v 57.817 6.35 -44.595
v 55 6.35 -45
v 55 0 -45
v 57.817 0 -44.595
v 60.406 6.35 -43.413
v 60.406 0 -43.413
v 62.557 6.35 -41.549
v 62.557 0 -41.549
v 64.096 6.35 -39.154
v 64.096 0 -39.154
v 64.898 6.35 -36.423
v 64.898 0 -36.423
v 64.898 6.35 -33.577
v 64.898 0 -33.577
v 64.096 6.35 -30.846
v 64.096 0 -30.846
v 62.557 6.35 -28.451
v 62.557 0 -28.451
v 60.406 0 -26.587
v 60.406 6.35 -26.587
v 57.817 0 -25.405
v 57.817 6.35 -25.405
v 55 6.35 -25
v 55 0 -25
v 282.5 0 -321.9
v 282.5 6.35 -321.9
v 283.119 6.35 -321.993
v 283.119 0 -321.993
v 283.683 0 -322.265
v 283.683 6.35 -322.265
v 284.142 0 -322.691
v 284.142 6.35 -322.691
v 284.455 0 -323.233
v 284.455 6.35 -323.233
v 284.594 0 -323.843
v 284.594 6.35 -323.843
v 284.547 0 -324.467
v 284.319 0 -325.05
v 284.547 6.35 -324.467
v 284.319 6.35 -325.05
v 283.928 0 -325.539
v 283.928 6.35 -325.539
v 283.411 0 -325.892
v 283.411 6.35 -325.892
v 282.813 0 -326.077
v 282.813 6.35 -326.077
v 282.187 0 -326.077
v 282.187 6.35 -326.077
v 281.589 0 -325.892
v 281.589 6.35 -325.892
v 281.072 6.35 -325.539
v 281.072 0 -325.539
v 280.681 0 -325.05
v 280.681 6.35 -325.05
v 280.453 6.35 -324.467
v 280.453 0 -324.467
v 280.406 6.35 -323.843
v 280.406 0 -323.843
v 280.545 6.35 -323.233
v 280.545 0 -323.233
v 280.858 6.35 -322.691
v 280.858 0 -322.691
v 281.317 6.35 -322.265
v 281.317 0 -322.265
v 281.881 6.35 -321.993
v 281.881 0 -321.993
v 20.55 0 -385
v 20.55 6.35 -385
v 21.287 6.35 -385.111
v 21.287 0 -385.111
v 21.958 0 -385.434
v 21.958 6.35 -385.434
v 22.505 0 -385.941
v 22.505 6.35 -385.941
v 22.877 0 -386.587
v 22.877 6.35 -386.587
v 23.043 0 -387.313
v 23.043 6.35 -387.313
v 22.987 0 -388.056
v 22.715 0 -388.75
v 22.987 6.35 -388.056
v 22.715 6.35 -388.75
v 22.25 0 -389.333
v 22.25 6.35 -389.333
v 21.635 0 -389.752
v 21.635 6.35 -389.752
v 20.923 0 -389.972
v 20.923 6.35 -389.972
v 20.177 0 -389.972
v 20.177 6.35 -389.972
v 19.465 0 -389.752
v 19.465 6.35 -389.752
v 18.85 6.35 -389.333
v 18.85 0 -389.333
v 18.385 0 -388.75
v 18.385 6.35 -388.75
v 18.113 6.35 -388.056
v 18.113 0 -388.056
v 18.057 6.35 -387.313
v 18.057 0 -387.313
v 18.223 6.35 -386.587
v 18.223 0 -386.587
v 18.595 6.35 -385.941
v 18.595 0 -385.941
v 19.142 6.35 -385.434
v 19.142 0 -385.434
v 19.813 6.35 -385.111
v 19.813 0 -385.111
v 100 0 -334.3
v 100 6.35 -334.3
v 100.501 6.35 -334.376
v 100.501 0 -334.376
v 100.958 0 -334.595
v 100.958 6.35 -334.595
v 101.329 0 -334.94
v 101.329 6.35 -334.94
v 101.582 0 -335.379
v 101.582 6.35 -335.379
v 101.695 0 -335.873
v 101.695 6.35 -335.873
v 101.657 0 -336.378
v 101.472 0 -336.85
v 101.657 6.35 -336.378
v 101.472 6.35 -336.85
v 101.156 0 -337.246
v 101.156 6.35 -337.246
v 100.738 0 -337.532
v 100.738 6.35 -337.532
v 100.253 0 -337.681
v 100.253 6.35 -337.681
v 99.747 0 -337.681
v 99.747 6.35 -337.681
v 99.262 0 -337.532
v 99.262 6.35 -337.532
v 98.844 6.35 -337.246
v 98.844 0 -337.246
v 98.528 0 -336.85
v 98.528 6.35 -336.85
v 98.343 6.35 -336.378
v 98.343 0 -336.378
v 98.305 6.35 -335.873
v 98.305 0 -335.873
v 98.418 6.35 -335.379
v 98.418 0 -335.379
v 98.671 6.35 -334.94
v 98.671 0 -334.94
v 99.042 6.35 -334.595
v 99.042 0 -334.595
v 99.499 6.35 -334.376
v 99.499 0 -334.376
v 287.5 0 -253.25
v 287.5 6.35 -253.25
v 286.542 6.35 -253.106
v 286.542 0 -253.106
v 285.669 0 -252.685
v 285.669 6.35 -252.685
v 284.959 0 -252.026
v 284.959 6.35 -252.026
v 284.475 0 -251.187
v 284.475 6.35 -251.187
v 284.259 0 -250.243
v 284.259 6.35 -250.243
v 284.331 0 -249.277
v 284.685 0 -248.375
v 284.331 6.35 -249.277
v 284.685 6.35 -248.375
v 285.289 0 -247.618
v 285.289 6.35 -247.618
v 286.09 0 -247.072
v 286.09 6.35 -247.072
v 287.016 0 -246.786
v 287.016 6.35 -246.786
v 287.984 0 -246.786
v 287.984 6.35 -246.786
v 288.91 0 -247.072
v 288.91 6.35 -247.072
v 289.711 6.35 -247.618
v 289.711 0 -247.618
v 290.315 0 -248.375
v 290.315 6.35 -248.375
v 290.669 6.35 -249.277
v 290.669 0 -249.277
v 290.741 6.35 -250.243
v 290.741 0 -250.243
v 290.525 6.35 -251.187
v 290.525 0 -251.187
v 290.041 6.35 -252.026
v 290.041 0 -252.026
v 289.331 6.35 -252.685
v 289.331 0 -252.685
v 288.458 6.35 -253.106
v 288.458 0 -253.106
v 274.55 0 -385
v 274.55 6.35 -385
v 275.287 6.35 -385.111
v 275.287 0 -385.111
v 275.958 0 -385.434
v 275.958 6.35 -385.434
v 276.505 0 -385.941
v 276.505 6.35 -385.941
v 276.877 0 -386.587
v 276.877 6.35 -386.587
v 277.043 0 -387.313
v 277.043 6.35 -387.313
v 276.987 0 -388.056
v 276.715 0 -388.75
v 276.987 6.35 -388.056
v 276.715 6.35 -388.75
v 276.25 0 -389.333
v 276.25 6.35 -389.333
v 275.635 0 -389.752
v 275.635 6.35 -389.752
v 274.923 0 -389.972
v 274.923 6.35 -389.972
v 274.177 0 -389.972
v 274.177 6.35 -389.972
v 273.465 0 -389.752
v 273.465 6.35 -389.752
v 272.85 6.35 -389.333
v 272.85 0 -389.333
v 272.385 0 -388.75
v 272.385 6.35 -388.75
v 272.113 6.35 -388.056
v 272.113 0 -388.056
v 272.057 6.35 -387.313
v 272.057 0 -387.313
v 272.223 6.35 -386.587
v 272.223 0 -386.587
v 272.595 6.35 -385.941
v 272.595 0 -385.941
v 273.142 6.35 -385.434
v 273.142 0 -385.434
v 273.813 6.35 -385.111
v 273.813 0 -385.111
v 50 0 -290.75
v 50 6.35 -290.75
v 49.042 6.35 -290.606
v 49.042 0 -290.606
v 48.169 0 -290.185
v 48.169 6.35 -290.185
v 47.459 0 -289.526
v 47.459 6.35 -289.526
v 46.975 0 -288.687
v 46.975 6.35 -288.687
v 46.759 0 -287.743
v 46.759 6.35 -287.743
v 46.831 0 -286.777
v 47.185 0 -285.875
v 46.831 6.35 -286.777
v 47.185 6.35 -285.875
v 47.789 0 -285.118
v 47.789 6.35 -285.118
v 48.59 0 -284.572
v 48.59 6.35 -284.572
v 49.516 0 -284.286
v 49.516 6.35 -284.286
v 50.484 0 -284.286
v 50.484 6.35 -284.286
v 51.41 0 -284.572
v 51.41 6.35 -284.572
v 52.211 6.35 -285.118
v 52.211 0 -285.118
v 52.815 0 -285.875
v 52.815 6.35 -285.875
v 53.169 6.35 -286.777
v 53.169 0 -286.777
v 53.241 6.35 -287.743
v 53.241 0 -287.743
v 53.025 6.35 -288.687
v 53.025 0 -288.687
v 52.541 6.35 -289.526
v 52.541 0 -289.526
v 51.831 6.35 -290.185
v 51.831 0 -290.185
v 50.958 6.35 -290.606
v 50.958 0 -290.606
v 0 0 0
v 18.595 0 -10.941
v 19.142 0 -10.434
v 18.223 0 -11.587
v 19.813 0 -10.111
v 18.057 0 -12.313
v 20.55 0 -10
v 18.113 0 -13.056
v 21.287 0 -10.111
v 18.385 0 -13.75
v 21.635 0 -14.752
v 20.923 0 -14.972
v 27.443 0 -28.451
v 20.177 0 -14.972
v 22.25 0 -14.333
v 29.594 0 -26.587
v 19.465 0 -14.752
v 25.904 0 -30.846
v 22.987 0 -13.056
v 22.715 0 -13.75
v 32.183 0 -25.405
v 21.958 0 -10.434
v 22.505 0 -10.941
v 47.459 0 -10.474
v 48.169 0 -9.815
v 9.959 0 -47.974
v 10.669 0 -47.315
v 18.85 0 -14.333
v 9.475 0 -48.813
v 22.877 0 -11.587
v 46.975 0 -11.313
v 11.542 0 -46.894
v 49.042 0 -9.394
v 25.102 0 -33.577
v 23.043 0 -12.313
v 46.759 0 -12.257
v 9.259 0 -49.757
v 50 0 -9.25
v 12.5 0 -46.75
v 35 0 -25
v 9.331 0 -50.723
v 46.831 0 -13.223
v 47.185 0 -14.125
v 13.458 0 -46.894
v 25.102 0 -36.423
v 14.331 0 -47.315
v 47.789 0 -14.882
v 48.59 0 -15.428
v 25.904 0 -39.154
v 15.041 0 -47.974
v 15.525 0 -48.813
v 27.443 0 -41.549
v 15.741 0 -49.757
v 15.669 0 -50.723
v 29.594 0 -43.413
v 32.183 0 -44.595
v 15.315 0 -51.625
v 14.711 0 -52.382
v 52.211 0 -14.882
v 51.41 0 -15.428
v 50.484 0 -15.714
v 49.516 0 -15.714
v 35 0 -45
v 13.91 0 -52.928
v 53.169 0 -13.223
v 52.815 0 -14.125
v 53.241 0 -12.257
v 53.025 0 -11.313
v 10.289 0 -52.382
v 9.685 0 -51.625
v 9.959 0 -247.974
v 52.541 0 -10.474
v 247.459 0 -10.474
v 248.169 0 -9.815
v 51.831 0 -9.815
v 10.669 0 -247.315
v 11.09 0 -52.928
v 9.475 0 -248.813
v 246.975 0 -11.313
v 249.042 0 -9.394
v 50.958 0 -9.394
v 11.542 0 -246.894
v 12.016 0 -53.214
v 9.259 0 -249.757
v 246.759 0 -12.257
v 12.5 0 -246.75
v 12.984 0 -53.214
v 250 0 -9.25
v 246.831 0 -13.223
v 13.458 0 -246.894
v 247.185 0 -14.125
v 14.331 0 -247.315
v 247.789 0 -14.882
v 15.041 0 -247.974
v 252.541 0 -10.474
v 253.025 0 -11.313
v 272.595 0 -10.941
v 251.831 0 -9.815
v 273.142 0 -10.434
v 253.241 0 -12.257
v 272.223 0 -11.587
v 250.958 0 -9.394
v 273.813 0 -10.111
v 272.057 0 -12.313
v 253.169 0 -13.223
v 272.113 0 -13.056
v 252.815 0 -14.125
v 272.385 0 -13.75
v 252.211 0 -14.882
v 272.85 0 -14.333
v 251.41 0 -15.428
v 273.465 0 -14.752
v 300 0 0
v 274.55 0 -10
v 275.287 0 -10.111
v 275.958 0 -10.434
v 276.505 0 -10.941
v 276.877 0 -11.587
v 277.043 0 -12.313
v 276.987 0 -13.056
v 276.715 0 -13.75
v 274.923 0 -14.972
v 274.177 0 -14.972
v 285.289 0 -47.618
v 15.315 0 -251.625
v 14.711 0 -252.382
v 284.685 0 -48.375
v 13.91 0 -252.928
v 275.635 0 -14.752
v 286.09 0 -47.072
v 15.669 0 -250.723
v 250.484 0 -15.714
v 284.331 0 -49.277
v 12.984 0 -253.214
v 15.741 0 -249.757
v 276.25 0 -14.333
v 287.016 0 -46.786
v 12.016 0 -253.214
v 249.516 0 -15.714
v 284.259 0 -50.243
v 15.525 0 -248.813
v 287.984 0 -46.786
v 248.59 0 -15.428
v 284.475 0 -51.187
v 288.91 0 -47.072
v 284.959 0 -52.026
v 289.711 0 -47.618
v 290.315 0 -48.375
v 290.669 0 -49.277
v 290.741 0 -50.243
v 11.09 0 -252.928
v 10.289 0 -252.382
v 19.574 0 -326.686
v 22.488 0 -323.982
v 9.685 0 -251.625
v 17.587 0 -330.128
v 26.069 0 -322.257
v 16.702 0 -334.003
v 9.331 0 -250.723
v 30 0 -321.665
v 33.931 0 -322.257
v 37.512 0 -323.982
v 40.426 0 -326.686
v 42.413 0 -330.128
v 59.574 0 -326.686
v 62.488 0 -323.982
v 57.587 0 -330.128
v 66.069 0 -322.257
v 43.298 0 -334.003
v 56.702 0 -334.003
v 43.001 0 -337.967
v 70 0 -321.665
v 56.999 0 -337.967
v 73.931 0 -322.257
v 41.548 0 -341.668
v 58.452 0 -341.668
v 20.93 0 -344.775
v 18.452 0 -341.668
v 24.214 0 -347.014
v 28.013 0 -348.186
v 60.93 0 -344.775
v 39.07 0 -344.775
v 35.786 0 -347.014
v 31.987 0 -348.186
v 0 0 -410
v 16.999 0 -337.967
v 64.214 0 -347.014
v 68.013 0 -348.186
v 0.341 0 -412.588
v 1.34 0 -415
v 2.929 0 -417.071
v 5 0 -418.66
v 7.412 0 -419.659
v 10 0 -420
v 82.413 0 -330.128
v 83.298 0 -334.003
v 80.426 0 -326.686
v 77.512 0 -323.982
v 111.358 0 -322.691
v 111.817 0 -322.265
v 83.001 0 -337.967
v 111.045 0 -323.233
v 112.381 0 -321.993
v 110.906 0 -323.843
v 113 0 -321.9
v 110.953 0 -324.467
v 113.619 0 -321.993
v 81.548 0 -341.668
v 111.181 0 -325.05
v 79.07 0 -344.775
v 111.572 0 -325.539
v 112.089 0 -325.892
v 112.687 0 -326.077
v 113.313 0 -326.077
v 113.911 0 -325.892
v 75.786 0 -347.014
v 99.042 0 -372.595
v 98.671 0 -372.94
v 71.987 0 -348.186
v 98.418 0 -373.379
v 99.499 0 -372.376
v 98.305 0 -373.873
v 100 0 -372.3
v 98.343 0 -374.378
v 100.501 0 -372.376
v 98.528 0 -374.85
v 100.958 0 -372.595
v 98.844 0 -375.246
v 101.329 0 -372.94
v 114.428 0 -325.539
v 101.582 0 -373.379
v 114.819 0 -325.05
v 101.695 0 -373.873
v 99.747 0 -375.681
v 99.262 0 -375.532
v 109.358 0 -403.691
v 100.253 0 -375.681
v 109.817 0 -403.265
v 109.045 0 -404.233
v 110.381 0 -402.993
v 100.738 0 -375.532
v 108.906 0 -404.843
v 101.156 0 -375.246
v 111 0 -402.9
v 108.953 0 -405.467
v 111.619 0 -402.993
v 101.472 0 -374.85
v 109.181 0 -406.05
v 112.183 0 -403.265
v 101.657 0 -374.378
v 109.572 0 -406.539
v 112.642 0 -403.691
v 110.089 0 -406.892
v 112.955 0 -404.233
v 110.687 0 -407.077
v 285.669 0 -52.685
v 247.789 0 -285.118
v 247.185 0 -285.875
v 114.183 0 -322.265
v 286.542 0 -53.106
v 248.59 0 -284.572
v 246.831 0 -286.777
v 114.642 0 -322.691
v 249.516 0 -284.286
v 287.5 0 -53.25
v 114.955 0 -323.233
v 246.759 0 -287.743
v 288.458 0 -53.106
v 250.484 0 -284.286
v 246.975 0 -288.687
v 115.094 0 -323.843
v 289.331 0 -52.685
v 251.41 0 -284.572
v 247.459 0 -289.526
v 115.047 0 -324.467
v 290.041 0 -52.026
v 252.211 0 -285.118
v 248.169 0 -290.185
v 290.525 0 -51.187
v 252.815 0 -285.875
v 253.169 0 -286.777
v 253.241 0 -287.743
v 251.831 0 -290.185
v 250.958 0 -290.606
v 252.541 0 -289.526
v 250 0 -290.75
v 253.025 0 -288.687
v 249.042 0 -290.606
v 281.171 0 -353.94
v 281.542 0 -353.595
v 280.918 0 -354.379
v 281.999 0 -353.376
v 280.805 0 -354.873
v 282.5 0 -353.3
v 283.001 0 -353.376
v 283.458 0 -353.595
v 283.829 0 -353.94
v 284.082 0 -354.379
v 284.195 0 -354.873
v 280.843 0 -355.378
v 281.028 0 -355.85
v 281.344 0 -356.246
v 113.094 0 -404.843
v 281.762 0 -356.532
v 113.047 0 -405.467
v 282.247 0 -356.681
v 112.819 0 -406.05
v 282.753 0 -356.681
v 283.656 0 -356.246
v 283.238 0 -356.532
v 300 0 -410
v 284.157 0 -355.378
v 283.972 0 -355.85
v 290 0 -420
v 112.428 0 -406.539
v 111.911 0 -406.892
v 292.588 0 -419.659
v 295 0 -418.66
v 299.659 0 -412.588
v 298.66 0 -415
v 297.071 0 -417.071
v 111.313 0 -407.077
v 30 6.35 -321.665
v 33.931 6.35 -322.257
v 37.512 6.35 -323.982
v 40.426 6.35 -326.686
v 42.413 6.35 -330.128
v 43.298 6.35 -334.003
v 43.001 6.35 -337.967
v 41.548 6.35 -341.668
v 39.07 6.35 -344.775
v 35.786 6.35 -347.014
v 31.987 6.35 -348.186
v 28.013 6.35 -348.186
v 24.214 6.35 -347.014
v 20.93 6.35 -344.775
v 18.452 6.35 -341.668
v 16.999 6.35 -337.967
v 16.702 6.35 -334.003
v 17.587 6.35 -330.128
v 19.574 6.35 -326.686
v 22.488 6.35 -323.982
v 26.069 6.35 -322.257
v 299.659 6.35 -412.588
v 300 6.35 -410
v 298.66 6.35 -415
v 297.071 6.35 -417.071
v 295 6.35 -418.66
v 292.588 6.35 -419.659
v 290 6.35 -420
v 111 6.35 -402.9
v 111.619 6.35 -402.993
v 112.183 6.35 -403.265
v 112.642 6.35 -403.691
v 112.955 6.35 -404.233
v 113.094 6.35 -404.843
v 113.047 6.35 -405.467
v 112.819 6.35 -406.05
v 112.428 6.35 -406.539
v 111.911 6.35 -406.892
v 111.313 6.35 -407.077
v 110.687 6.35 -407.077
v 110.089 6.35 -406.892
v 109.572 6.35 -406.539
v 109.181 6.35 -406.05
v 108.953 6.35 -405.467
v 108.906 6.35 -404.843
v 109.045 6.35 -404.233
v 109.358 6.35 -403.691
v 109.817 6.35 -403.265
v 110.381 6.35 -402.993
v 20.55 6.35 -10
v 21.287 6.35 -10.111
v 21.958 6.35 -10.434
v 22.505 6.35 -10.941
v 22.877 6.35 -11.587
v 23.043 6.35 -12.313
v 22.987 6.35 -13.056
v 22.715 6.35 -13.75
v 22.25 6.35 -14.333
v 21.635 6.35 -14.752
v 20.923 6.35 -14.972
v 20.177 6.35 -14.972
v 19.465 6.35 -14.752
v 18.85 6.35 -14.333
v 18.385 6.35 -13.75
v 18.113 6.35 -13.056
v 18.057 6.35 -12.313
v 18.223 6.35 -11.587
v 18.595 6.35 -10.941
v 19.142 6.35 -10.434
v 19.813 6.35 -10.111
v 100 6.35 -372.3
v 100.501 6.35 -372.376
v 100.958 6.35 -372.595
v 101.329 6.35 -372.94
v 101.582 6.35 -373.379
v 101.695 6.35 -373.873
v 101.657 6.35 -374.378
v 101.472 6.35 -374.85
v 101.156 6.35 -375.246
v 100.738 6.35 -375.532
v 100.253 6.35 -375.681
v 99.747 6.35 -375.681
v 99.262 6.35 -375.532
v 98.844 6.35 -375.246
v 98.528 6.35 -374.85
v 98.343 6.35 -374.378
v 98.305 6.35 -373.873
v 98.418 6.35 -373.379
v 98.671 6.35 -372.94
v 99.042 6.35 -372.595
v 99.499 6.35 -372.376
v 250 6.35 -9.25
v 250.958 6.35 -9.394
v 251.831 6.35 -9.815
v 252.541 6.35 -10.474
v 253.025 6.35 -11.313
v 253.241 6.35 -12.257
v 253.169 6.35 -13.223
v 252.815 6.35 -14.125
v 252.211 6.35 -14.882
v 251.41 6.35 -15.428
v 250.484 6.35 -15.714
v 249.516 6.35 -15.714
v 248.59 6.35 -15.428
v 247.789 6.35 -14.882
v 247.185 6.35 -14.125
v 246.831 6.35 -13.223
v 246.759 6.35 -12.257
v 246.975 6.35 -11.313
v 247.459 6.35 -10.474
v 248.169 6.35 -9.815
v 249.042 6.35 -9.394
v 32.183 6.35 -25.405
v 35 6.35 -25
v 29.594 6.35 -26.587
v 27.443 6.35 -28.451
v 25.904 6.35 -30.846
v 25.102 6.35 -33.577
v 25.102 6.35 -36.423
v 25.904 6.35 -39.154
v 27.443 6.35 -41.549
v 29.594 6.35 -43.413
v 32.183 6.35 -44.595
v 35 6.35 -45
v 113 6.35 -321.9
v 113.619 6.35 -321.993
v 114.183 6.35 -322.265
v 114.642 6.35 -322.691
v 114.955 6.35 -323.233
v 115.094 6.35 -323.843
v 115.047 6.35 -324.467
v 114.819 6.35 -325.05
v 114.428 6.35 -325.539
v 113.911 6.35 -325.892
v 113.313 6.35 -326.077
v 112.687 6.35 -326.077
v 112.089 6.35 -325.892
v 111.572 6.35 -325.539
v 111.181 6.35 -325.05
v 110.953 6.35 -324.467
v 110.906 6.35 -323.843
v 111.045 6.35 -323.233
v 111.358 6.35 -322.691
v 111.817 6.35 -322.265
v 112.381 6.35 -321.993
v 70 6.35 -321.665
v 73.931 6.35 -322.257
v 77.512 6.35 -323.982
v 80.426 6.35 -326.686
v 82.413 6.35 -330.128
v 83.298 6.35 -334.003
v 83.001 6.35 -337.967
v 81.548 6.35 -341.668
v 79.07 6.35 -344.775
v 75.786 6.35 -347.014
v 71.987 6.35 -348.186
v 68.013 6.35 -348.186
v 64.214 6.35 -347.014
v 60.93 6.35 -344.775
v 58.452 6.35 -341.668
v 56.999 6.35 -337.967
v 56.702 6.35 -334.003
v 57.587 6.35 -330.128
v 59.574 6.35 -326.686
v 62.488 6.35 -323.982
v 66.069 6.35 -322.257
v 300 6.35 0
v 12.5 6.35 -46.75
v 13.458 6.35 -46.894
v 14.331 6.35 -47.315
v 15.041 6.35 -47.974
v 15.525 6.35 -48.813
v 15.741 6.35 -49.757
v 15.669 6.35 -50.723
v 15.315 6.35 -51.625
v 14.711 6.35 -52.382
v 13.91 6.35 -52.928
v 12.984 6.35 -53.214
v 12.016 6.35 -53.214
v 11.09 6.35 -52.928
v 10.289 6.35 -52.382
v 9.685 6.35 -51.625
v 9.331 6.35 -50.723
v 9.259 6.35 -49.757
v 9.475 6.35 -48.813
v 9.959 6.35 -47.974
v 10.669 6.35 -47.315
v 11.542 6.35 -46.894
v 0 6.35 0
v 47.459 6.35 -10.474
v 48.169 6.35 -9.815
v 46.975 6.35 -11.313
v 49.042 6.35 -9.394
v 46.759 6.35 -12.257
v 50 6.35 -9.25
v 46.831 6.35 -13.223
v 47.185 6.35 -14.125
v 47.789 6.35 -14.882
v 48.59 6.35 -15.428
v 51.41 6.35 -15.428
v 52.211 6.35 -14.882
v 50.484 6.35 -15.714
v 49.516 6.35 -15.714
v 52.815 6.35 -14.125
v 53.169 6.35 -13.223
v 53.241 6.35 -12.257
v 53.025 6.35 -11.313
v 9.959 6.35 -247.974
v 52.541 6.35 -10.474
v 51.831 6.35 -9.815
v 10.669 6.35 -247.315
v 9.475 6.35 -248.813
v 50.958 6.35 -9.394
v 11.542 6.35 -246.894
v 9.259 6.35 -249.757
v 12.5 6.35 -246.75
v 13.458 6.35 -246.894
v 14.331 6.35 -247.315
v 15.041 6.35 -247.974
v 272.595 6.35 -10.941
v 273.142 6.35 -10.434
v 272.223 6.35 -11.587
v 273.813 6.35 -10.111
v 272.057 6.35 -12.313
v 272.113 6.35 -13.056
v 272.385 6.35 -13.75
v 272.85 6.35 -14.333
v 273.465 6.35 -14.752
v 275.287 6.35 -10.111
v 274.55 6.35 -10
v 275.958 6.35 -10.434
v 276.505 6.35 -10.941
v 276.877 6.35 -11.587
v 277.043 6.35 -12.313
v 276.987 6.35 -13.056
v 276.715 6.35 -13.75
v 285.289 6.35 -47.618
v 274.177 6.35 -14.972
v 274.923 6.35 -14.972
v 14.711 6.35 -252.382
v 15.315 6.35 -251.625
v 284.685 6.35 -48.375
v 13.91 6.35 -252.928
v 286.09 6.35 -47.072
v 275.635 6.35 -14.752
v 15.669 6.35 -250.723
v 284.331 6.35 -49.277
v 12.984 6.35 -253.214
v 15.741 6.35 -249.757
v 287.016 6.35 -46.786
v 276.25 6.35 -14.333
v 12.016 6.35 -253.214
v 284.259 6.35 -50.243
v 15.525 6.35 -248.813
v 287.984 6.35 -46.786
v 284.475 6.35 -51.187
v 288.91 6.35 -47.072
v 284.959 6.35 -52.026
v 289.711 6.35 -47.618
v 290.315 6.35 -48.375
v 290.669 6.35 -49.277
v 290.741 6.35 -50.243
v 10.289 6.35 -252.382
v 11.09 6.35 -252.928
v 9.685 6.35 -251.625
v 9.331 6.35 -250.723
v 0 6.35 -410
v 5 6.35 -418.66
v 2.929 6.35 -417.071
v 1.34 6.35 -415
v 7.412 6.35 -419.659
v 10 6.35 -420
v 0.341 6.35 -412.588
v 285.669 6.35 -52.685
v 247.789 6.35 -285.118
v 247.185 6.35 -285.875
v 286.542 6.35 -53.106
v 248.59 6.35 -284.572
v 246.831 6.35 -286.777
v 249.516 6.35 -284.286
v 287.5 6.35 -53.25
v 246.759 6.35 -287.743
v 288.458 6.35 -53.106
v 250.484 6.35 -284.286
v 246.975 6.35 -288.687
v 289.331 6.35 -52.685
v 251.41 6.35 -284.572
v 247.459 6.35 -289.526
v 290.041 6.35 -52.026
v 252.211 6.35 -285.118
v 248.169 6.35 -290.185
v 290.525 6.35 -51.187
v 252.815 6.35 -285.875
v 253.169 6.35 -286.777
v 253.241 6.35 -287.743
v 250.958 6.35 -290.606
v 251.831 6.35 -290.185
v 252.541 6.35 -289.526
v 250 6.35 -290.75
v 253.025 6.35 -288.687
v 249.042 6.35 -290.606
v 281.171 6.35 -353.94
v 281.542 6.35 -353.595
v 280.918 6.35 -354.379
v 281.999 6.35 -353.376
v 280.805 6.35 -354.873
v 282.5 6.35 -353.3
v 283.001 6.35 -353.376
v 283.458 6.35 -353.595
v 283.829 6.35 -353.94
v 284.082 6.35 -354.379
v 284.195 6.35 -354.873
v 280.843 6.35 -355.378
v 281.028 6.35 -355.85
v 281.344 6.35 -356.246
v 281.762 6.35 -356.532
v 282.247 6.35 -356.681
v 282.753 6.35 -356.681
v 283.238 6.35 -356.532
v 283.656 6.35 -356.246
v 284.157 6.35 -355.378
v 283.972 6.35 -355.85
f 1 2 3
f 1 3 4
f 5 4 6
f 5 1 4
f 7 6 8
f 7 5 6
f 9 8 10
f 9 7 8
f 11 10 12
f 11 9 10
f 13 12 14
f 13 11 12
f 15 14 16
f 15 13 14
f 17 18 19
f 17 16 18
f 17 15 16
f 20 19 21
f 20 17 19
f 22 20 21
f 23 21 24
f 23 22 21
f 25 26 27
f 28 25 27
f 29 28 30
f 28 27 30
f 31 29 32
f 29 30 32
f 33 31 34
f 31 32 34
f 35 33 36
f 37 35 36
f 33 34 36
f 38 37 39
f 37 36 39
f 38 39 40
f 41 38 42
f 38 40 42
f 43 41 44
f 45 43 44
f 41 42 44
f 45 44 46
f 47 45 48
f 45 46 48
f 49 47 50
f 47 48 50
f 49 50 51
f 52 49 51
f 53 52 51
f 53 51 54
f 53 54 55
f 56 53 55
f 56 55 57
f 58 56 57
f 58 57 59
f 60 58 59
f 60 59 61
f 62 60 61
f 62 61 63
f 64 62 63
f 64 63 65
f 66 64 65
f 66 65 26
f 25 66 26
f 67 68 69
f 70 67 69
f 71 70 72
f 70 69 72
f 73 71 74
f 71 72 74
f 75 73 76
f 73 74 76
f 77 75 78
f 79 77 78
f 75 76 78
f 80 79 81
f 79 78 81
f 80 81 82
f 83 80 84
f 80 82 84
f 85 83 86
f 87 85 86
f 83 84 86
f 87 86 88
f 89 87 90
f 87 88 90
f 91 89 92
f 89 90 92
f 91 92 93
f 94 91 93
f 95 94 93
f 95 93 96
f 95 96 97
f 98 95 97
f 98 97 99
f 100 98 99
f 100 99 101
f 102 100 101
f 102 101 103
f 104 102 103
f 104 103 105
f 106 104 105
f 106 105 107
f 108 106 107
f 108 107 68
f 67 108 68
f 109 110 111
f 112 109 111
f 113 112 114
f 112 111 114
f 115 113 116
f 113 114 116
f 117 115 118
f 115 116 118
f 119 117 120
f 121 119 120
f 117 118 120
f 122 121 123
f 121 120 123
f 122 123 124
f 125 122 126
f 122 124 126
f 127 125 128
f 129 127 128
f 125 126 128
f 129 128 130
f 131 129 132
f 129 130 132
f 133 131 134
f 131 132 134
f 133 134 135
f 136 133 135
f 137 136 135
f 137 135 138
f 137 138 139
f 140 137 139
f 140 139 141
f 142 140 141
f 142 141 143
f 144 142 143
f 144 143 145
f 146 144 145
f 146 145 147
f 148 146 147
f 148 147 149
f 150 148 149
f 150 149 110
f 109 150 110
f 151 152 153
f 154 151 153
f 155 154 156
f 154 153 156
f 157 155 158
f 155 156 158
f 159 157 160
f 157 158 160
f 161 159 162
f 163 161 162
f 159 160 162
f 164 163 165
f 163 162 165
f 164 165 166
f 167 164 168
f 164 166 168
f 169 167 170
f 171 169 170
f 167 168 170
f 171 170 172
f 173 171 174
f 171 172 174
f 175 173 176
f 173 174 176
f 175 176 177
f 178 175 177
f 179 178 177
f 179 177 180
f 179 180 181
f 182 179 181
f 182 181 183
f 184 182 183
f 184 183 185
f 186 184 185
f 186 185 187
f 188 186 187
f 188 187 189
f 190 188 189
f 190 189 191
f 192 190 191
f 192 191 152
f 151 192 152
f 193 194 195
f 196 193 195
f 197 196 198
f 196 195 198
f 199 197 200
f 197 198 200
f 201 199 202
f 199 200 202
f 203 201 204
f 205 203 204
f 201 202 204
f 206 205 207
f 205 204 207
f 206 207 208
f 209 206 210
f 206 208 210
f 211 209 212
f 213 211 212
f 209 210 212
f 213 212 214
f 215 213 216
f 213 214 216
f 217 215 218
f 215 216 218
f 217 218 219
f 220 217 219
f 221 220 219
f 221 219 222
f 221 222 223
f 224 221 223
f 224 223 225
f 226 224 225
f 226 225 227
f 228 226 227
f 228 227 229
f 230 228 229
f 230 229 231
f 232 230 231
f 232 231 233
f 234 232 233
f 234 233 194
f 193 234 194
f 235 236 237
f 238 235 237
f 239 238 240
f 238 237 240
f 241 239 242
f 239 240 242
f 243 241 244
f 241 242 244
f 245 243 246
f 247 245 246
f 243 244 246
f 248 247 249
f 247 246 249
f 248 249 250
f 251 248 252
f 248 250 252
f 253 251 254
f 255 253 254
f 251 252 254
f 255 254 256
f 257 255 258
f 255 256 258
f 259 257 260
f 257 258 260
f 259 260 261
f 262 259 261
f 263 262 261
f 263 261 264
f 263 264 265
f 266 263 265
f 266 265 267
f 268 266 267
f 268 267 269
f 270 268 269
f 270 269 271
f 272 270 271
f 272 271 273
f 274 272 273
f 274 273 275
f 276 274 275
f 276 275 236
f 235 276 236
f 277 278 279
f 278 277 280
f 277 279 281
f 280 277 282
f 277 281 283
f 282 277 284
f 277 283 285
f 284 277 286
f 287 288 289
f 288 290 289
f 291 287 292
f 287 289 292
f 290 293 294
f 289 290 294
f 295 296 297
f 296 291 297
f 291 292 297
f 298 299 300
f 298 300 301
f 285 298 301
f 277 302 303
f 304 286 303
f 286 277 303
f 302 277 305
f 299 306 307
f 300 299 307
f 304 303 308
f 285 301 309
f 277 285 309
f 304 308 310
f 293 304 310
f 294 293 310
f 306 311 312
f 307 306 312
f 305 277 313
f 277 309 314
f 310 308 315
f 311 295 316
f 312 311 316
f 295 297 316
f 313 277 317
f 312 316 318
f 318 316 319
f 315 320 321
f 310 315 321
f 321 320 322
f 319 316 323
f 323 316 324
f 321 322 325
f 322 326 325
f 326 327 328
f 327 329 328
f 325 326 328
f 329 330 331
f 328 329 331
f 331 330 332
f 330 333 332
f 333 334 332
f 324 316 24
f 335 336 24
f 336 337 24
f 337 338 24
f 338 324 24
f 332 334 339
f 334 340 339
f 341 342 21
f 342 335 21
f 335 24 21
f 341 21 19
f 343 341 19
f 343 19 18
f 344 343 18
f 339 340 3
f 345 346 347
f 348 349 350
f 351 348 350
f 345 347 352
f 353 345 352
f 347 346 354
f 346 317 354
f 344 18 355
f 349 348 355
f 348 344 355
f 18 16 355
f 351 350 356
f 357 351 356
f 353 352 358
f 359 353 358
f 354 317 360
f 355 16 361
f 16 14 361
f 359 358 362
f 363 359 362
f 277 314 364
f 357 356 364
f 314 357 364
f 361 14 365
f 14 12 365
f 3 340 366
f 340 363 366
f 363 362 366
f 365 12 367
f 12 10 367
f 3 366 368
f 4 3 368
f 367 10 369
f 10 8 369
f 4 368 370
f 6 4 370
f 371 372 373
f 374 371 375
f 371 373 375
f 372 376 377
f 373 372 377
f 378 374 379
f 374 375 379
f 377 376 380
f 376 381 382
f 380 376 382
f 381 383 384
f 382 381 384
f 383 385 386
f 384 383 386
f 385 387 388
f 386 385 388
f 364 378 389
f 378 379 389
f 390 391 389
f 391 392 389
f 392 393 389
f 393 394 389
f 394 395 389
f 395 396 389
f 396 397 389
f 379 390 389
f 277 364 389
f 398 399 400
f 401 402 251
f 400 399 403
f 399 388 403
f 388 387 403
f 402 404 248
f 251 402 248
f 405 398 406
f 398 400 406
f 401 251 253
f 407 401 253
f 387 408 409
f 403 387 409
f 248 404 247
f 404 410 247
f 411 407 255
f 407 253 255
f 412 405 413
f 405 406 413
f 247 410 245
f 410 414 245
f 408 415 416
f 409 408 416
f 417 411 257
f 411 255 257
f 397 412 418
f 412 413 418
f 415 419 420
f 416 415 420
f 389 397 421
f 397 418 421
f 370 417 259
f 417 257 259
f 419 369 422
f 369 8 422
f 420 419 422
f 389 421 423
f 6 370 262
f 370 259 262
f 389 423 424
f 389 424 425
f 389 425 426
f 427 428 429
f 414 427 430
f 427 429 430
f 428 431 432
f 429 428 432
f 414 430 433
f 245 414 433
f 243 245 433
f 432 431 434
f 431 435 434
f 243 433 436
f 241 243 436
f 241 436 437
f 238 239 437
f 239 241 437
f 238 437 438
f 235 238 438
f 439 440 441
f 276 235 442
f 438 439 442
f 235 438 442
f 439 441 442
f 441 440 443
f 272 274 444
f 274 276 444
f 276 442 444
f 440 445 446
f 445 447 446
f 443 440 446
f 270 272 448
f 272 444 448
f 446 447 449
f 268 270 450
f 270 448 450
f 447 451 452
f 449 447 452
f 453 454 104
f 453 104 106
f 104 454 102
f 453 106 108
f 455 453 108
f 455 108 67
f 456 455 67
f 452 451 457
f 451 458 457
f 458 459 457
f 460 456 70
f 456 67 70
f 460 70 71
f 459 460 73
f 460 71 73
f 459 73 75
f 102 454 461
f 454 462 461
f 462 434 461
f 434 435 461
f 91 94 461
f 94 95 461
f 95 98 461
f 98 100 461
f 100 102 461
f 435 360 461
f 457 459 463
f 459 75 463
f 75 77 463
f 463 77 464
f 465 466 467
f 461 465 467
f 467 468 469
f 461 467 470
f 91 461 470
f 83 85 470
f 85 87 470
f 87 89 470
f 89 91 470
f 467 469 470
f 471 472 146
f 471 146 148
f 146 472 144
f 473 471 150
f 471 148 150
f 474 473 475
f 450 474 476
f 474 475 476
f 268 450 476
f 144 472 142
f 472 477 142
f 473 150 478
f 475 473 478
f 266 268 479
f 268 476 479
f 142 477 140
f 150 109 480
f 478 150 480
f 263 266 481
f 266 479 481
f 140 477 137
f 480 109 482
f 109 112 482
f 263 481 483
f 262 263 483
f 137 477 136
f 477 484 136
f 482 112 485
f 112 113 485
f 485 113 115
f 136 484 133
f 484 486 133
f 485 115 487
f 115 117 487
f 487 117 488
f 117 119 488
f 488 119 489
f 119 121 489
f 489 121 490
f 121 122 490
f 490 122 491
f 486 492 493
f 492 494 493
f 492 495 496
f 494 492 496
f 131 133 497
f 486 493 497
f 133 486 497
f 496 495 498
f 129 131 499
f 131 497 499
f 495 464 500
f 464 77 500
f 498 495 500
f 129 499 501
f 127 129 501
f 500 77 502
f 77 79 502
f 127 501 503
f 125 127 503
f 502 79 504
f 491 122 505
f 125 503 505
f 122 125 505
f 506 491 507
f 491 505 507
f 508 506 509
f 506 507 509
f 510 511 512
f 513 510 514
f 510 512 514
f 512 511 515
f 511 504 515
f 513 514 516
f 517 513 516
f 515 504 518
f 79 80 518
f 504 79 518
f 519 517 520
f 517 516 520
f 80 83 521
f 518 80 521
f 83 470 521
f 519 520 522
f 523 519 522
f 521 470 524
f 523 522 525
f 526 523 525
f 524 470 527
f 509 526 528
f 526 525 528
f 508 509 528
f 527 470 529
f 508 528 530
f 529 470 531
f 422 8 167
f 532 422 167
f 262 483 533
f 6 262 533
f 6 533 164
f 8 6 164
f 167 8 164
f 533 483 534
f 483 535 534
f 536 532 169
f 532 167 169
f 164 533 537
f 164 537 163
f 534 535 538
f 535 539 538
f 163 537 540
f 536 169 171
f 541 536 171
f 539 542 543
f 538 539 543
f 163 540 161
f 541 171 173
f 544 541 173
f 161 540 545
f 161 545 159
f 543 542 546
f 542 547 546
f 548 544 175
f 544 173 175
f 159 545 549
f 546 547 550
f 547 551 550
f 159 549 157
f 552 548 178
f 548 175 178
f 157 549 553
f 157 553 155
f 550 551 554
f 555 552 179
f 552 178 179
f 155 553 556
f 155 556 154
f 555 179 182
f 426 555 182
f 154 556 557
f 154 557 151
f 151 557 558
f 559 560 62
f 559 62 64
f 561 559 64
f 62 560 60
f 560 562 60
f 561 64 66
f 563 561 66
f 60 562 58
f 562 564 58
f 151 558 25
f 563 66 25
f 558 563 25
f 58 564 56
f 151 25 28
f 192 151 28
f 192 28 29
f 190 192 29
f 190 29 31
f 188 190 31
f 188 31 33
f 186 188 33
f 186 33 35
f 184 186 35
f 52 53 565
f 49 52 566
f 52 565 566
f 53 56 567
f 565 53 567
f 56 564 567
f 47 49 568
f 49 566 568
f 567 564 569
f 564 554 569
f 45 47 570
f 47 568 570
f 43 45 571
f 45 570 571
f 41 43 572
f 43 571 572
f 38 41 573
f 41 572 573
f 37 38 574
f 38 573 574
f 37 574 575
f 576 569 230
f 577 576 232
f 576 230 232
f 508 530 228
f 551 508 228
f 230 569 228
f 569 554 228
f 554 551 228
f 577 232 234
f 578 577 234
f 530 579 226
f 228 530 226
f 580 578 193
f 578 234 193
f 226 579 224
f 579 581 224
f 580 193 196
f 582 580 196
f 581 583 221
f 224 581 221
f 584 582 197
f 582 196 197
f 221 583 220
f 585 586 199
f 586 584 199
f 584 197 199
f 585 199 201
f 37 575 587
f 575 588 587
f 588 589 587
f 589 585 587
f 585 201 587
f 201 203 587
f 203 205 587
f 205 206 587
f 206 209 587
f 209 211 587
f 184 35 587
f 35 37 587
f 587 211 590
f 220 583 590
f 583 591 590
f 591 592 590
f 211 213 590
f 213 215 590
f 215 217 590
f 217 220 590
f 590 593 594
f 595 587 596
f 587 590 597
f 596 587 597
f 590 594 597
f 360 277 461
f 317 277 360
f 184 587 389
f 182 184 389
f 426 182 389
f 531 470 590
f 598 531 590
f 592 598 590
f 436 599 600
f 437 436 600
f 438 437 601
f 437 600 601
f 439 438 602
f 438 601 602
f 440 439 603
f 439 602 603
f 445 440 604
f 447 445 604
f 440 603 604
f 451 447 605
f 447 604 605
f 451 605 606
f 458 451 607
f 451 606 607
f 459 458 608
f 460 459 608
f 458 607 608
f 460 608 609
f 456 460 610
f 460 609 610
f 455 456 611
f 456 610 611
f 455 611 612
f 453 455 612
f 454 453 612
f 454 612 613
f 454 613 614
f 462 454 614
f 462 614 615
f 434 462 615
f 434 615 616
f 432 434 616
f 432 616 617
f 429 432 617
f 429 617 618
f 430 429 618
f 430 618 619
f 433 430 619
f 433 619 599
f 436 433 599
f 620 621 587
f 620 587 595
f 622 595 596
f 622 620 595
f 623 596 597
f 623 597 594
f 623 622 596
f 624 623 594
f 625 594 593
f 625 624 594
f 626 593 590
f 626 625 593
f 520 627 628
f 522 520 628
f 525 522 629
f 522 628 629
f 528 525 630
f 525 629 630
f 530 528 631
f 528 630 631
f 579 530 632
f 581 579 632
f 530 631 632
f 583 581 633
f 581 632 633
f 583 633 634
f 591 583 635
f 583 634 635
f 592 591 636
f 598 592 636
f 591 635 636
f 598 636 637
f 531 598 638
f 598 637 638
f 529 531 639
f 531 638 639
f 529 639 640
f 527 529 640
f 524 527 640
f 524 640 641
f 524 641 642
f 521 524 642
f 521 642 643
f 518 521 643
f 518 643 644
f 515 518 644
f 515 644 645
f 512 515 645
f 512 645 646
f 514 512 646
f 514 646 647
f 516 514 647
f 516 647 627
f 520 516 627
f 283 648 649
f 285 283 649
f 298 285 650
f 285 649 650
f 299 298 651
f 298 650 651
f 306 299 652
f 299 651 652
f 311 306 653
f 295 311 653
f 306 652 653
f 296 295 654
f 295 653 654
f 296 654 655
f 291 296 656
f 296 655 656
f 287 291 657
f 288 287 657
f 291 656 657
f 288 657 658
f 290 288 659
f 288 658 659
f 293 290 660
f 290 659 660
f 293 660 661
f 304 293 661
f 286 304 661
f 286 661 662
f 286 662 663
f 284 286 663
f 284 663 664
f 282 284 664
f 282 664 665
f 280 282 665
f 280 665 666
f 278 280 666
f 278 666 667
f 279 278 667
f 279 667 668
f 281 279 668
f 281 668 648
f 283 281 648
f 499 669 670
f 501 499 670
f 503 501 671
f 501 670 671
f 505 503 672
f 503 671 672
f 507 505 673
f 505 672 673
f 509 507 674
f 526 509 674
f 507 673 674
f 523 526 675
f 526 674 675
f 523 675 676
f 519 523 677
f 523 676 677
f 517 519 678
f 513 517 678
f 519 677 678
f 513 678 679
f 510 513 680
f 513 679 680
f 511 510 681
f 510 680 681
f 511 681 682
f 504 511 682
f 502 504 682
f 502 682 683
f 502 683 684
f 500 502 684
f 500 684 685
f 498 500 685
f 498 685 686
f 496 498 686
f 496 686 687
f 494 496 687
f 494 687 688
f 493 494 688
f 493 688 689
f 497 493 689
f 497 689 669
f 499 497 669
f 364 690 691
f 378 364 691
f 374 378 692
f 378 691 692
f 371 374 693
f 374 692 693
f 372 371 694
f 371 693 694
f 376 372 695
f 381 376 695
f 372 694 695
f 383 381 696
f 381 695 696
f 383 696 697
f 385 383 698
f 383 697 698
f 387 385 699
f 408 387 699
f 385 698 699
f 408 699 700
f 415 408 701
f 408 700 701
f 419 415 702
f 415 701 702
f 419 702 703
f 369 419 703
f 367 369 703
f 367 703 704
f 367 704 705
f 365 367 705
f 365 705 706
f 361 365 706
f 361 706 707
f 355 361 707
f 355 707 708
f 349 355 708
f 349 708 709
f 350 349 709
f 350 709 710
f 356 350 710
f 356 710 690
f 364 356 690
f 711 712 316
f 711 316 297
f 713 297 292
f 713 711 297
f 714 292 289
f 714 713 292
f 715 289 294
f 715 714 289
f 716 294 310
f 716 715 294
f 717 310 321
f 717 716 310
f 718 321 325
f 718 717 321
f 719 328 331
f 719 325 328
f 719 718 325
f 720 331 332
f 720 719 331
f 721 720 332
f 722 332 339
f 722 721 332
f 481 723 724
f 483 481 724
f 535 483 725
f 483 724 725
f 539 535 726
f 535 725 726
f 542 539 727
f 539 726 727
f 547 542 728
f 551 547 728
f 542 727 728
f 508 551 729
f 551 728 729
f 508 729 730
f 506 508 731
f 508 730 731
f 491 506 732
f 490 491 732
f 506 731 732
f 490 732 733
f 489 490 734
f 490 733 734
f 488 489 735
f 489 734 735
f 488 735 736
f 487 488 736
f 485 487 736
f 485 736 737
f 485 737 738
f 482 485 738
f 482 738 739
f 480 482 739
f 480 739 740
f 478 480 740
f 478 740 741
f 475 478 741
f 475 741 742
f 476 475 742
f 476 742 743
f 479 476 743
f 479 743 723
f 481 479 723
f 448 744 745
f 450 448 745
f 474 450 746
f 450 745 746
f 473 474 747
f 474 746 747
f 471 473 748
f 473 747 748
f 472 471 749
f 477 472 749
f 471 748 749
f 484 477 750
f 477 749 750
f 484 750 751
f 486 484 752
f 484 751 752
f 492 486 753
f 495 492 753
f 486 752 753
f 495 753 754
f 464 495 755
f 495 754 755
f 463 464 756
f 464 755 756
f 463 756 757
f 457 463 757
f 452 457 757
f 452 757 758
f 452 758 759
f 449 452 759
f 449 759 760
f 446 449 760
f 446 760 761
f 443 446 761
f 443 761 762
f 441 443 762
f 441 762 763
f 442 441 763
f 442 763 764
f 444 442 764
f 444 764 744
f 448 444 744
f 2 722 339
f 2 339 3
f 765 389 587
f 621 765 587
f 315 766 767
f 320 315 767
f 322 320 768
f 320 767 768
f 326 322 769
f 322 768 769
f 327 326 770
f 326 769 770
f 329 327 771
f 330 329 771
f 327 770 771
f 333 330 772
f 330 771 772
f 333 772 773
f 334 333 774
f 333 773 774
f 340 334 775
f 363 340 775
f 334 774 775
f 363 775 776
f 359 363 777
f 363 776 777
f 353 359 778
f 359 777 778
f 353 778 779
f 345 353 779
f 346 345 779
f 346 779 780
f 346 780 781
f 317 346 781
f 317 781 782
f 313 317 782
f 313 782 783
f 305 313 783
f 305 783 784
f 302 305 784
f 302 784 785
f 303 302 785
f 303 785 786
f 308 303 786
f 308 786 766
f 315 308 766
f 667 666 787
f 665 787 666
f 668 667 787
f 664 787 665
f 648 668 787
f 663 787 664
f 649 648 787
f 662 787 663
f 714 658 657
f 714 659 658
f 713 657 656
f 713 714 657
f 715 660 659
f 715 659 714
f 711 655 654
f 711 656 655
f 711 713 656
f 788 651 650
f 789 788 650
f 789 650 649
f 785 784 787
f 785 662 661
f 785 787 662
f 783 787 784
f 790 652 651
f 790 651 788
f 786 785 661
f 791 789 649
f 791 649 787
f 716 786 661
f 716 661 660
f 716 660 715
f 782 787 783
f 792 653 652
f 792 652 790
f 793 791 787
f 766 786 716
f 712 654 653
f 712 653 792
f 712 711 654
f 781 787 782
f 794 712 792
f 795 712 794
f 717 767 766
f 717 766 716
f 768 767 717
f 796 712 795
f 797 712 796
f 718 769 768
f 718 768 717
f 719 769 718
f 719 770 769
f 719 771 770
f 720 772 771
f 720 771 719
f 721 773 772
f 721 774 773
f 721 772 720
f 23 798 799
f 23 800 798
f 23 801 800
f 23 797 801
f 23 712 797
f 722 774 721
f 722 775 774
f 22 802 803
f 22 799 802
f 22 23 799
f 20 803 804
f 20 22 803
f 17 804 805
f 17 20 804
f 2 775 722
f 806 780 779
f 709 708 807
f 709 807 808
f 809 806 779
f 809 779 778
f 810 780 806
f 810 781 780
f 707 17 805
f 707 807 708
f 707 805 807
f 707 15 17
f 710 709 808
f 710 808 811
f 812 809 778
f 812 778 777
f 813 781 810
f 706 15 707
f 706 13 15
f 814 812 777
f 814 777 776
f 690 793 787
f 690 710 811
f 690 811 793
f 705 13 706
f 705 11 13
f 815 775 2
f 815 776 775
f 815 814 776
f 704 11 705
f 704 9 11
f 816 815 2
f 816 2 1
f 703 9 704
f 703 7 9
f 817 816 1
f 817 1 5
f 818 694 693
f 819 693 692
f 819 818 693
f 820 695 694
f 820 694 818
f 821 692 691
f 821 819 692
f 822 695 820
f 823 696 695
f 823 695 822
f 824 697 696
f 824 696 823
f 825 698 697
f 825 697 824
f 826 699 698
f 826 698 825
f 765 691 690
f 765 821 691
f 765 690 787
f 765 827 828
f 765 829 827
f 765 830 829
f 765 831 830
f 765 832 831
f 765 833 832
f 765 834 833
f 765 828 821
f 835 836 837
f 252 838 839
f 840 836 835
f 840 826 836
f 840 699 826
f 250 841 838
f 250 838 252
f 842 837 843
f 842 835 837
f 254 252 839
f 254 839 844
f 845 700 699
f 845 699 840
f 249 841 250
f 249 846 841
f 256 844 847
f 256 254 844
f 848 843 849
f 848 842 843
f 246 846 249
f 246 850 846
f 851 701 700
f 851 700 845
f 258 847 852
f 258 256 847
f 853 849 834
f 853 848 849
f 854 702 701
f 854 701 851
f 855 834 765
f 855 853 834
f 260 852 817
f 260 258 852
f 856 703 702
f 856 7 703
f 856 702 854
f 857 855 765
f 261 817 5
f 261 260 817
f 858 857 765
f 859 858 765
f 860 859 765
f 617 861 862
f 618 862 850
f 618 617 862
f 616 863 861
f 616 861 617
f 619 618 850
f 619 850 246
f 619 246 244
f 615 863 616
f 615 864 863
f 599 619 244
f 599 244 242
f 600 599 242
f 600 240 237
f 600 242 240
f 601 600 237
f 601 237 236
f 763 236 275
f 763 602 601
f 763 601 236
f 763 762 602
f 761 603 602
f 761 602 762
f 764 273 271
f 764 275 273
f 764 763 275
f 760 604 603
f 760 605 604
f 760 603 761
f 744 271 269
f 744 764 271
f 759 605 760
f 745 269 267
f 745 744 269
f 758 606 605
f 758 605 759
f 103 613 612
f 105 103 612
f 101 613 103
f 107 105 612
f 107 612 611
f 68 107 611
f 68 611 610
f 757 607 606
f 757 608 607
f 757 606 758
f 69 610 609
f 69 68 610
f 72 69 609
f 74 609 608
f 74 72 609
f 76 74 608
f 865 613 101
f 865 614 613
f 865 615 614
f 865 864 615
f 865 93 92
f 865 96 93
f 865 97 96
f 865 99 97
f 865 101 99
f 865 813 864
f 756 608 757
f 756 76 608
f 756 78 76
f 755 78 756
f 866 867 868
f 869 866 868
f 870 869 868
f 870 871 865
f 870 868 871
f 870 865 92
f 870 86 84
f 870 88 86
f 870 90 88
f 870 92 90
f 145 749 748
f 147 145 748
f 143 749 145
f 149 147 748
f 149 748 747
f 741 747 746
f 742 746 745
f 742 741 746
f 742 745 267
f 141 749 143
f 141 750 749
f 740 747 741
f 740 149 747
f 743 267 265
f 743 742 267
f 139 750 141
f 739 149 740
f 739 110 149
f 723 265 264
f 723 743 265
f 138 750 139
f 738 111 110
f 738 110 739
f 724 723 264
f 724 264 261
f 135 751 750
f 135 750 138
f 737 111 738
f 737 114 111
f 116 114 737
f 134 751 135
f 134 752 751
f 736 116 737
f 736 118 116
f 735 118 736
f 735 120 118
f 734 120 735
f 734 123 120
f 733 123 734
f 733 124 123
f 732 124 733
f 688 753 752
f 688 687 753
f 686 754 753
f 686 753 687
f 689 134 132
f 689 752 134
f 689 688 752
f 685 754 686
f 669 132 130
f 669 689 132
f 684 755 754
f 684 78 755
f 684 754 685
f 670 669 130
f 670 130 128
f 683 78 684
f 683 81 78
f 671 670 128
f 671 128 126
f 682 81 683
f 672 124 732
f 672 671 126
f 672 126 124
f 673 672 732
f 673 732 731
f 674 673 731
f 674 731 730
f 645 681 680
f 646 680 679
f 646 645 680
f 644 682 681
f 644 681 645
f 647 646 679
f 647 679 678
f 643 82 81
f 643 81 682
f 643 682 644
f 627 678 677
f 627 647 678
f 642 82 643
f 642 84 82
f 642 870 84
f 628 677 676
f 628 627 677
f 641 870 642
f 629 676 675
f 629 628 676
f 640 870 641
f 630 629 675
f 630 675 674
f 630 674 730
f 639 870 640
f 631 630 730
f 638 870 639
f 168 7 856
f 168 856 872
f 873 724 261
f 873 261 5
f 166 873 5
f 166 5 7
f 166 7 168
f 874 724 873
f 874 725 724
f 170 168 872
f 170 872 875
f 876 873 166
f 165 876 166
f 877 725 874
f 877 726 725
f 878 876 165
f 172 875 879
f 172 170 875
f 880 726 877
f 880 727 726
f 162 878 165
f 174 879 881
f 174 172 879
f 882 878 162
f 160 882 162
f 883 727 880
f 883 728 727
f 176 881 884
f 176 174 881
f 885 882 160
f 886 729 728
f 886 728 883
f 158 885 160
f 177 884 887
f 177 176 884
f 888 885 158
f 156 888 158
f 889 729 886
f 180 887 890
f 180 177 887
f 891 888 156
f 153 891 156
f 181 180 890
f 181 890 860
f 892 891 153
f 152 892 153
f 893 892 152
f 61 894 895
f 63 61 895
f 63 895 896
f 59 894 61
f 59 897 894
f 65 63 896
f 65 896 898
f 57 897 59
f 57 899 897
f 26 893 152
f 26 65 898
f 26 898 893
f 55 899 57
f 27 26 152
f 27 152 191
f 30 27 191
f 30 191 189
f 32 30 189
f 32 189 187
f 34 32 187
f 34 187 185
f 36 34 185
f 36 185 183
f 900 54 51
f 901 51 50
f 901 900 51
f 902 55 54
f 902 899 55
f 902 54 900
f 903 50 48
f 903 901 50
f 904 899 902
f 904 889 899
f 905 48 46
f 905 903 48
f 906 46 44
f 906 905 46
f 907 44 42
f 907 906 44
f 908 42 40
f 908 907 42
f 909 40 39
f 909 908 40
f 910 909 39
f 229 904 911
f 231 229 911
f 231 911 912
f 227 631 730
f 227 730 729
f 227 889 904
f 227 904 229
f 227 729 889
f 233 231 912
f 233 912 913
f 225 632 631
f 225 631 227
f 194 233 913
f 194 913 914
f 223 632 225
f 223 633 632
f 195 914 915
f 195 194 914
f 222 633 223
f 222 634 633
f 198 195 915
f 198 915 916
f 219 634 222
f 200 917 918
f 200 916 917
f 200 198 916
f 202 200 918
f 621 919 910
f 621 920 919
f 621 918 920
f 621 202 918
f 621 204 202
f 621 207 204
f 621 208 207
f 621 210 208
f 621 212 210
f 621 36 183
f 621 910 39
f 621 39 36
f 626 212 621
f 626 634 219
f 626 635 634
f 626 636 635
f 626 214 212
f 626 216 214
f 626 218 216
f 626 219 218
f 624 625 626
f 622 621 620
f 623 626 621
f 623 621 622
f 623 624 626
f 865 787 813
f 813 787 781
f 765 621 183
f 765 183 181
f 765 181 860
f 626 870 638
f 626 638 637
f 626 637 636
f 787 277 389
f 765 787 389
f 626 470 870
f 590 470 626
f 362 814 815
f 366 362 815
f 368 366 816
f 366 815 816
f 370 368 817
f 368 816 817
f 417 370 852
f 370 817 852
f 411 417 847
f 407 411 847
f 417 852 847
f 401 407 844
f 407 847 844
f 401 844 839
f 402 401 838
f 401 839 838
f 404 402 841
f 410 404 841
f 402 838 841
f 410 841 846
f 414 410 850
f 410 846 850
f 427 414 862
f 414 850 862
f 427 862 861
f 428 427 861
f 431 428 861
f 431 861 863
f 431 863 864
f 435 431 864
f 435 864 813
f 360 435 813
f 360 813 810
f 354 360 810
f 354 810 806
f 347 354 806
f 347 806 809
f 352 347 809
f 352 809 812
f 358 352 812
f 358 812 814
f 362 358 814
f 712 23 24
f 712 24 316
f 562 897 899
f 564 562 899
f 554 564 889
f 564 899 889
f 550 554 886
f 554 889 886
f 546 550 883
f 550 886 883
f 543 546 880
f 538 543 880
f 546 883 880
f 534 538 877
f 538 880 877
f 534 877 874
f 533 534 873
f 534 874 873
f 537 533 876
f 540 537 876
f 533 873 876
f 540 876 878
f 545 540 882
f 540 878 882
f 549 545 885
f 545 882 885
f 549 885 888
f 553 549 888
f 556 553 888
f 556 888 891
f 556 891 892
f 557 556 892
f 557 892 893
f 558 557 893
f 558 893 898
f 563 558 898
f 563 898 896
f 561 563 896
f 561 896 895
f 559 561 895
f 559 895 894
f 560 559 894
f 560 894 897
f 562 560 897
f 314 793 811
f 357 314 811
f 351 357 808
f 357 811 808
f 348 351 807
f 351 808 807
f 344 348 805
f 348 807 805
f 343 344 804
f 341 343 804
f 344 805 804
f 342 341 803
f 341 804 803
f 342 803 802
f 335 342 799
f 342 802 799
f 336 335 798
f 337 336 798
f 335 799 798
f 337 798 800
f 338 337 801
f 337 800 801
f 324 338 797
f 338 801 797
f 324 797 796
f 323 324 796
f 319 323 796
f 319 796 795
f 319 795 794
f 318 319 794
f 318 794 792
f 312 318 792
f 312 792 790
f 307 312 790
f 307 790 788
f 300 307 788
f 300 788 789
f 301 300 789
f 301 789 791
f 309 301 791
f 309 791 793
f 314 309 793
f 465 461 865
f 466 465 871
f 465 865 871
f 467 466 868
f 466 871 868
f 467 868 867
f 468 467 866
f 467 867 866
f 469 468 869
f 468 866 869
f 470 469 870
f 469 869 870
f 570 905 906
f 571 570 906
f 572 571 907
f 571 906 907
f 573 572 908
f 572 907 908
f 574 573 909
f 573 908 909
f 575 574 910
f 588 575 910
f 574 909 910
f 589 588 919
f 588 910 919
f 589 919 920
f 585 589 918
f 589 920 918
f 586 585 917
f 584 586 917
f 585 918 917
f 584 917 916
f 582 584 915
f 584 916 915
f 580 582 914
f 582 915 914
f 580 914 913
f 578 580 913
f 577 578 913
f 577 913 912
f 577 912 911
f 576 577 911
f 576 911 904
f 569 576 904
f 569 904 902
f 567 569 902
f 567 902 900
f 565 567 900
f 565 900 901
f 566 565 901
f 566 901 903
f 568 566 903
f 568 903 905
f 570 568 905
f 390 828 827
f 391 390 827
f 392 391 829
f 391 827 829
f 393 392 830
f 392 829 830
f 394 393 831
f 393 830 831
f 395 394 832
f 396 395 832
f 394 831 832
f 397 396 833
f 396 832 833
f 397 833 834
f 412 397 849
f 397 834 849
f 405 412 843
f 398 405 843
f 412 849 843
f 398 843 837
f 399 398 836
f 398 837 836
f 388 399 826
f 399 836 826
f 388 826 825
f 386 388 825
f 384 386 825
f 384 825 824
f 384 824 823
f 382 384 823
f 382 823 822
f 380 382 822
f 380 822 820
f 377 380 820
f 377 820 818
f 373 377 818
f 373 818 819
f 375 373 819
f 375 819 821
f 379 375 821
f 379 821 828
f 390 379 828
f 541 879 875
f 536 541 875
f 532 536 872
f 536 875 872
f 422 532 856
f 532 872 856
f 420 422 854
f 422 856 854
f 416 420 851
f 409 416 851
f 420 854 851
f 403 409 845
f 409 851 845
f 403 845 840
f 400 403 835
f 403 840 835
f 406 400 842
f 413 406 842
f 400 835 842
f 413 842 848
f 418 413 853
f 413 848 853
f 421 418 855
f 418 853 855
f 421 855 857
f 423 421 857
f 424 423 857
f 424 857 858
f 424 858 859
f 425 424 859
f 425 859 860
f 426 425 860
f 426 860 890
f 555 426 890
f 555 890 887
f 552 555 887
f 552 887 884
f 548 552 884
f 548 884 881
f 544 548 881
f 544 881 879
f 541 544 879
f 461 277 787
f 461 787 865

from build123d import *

# Parameters (mm, degrees)
SKETCH1_W           = 300
SKETCH1_H           = 420
BOSS_EXTRUDE1_DEPTH = 6.35
SKETCH3_R           = 3.25
CUT_EXTRUDE1_DEPTH  = 517.178576173
SKETCH4_R           = 2.5
CUT_EXTRUDE2_DEPTH  = 517.178576173
SKETCH6_R           = 1.7
CUT_EXTRUDE3_DEPTH  = 517.178576173
CUT_EXTRUDE4_DEPTH  = 10
SKETCH8_R           = 13.335
CUT_EXTRUDE5_DEPTH  = 517.178576173
SKETCH9_R           = 2.1
CUT_EXTRUDE6_DEPTH  = 517.178576173
CUT_EXTRUDE7_DEPTH  = 517.178576173


with BuildPart() as part:
    # Sketch1 → Boss-Extrude1 (new body)
    with BuildSketch(Plane(origin=(0, 0, 0), x_dir=(1, 0, 0), z_dir=(0, 1, 0))):
        with Locations((150, 210)):
            Rectangle(SKETCH1_W, SKETCH1_H)
    extrude(amount=BOSS_EXTRUDE1_DEPTH)

    # Sketch3 → Cut-Extrude1 (cut, through all)
    with BuildSketch(Plane(origin=(0, 6.35, 0), x_dir=(1, 0, 0), z_dir=(0, 1, 0))):
        with Locations(Location((50, 12.5, 0), (0, 0, 270))):
            Circle(SKETCH3_R)
        with Locations(Location((250, 12.5, 0), (0, 0, 270))):
            Circle(SKETCH3_R)
        with Locations(Location((12.5, 50, 0), (0, 0, 270))):
            Circle(SKETCH3_R)
        with Locations(Location((12.5, 250, 0), (0, 0, 270))):
            Circle(SKETCH3_R)
        with Locations(Location((250, 287.5, 0), (0, 0, 90))):
            Circle(SKETCH3_R)
        with Locations(Location((50, 287.5, 0), (0, 0, 90))):
            Circle(SKETCH3_R)
        with Locations(Location((287.5, 250, 0), (0, 0, 90))):
            Circle(SKETCH3_R)
        with Locations(Location((287.5, 50, 0), (0, 0, 90))):
            Circle(SKETCH3_R)
    extrude(amount=-CUT_EXTRUDE1_DEPTH, mode=Mode.SUBTRACT)

    # Sketch4 → Cut-Extrude2 (cut, through all)
    with BuildSketch(Plane(origin=(0, 6.35, 0), x_dir=(1, 0, 0), z_dir=(0, 1, 0))):
        with Locations(Location((20.55, 12.5, 0), (0, 0, 270))):
            Circle(SKETCH4_R)
        with Locations(Location((274.55, 12.5, 0), (0, 0, 270))):
            Circle(SKETCH4_R)
        with Locations(Location((20.55, 387.5, 0), (0, 0, 270))):
            Circle(SKETCH4_R)
        with Locations(Location((274.55, 387.5, 0), (0, 0, 270))):
            Circle(SKETCH4_R)
    extrude(amount=-CUT_EXTRUDE2_DEPTH, mode=Mode.SUBTRACT)

    # Sketch6 → Cut-Extrude3 (cut, through all)
    with BuildSketch(Plane(origin=(0, 6.35, 0), x_dir=(1, 0, 0), z_dir=(0, 1, 0))):
        with Locations(Location((282.5, 355, 0), (0, 0, 270))):
            Circle(SKETCH6_R)
        with Locations(Location((100, 336, 0), (0, 0, 270))):
            Circle(SKETCH6_R)
        with Locations(Location((100, 374, 0), (0, 0, 270))):
            Circle(SKETCH6_R)
    extrude(amount=-CUT_EXTRUDE3_DEPTH, mode=Mode.SUBTRACT)

    # Sketch7 → Cut-Extrude4 (cut)
    with BuildSketch(Plane(origin=(0, 6.35, 0), x_dir=(1, 0, 0), z_dir=(0, 1, 0))):
        with BuildLine():
            Line((290, 420), (300, 420))
            Line((300, 420), (300, 410))
            ThreePointArc((300, 410), (297.071067812, 417.071067812), (290, 420))
        make_face()
        with BuildLine():
            Line((10, 420), (0, 420))
            Line((0, 420), (0, 410))
            ThreePointArc((0, 410), (2.928932188, 417.071067812), (10, 420))
        make_face()
    extrude(amount=-CUT_EXTRUDE4_DEPTH, mode=Mode.SUBTRACT)

    # Sketch8 → Cut-Extrude5 (cut, through all)
    with BuildSketch(Plane(origin=(0, 6.35, 0), x_dir=(1, 0, 0), z_dir=(0, 1, 0))):
        with Locations(Location((70, 335, 0), (0, 0, 270))):
            Circle(SKETCH8_R)
        with Locations(Location((30, 335, 0), (0, 0, 270))):
            Circle(SKETCH8_R)
    extrude(amount=-CUT_EXTRUDE5_DEPTH, mode=Mode.SUBTRACT)

    # Sketch9 → Cut-Extrude6 (cut, through all)
    with BuildSketch(Plane(origin=(0, 6.35, 0), x_dir=(1, 0, 0), z_dir=(0, 1, 0))):
        with Locations(Location((282.5, 324, 0), (0, 0, 270))):
            Circle(SKETCH9_R)
        with Locations(Location((111, 405, 0), (0, 0, 270))):
            Circle(SKETCH9_R)
        with Locations(Location((113, 324, 0), (0, 0, 270))):
            Circle(SKETCH9_R)
    extrude(amount=-CUT_EXTRUDE6_DEPTH, mode=Mode.SUBTRACT)

    # Sketch10 → Cut-Extrude7 (cut, through all)
    with BuildSketch(Plane(origin=(0, 6.35, 0), x_dir=(1, 0, 0), z_dir=(0, 1, 0))):
        with BuildLine():
            Line((55, 25), (35, 25))
            ThreePointArc((35, 25), (25, 35), (35, 45))
            Line((35, 45), (55, 45))
            ThreePointArc((55, 45), (65, 35), (55, 25))
        make_face()
    extrude(amount=-CUT_EXTRUDE7_DEPTH, mode=Mode.SUBTRACT)


solid = part.part
